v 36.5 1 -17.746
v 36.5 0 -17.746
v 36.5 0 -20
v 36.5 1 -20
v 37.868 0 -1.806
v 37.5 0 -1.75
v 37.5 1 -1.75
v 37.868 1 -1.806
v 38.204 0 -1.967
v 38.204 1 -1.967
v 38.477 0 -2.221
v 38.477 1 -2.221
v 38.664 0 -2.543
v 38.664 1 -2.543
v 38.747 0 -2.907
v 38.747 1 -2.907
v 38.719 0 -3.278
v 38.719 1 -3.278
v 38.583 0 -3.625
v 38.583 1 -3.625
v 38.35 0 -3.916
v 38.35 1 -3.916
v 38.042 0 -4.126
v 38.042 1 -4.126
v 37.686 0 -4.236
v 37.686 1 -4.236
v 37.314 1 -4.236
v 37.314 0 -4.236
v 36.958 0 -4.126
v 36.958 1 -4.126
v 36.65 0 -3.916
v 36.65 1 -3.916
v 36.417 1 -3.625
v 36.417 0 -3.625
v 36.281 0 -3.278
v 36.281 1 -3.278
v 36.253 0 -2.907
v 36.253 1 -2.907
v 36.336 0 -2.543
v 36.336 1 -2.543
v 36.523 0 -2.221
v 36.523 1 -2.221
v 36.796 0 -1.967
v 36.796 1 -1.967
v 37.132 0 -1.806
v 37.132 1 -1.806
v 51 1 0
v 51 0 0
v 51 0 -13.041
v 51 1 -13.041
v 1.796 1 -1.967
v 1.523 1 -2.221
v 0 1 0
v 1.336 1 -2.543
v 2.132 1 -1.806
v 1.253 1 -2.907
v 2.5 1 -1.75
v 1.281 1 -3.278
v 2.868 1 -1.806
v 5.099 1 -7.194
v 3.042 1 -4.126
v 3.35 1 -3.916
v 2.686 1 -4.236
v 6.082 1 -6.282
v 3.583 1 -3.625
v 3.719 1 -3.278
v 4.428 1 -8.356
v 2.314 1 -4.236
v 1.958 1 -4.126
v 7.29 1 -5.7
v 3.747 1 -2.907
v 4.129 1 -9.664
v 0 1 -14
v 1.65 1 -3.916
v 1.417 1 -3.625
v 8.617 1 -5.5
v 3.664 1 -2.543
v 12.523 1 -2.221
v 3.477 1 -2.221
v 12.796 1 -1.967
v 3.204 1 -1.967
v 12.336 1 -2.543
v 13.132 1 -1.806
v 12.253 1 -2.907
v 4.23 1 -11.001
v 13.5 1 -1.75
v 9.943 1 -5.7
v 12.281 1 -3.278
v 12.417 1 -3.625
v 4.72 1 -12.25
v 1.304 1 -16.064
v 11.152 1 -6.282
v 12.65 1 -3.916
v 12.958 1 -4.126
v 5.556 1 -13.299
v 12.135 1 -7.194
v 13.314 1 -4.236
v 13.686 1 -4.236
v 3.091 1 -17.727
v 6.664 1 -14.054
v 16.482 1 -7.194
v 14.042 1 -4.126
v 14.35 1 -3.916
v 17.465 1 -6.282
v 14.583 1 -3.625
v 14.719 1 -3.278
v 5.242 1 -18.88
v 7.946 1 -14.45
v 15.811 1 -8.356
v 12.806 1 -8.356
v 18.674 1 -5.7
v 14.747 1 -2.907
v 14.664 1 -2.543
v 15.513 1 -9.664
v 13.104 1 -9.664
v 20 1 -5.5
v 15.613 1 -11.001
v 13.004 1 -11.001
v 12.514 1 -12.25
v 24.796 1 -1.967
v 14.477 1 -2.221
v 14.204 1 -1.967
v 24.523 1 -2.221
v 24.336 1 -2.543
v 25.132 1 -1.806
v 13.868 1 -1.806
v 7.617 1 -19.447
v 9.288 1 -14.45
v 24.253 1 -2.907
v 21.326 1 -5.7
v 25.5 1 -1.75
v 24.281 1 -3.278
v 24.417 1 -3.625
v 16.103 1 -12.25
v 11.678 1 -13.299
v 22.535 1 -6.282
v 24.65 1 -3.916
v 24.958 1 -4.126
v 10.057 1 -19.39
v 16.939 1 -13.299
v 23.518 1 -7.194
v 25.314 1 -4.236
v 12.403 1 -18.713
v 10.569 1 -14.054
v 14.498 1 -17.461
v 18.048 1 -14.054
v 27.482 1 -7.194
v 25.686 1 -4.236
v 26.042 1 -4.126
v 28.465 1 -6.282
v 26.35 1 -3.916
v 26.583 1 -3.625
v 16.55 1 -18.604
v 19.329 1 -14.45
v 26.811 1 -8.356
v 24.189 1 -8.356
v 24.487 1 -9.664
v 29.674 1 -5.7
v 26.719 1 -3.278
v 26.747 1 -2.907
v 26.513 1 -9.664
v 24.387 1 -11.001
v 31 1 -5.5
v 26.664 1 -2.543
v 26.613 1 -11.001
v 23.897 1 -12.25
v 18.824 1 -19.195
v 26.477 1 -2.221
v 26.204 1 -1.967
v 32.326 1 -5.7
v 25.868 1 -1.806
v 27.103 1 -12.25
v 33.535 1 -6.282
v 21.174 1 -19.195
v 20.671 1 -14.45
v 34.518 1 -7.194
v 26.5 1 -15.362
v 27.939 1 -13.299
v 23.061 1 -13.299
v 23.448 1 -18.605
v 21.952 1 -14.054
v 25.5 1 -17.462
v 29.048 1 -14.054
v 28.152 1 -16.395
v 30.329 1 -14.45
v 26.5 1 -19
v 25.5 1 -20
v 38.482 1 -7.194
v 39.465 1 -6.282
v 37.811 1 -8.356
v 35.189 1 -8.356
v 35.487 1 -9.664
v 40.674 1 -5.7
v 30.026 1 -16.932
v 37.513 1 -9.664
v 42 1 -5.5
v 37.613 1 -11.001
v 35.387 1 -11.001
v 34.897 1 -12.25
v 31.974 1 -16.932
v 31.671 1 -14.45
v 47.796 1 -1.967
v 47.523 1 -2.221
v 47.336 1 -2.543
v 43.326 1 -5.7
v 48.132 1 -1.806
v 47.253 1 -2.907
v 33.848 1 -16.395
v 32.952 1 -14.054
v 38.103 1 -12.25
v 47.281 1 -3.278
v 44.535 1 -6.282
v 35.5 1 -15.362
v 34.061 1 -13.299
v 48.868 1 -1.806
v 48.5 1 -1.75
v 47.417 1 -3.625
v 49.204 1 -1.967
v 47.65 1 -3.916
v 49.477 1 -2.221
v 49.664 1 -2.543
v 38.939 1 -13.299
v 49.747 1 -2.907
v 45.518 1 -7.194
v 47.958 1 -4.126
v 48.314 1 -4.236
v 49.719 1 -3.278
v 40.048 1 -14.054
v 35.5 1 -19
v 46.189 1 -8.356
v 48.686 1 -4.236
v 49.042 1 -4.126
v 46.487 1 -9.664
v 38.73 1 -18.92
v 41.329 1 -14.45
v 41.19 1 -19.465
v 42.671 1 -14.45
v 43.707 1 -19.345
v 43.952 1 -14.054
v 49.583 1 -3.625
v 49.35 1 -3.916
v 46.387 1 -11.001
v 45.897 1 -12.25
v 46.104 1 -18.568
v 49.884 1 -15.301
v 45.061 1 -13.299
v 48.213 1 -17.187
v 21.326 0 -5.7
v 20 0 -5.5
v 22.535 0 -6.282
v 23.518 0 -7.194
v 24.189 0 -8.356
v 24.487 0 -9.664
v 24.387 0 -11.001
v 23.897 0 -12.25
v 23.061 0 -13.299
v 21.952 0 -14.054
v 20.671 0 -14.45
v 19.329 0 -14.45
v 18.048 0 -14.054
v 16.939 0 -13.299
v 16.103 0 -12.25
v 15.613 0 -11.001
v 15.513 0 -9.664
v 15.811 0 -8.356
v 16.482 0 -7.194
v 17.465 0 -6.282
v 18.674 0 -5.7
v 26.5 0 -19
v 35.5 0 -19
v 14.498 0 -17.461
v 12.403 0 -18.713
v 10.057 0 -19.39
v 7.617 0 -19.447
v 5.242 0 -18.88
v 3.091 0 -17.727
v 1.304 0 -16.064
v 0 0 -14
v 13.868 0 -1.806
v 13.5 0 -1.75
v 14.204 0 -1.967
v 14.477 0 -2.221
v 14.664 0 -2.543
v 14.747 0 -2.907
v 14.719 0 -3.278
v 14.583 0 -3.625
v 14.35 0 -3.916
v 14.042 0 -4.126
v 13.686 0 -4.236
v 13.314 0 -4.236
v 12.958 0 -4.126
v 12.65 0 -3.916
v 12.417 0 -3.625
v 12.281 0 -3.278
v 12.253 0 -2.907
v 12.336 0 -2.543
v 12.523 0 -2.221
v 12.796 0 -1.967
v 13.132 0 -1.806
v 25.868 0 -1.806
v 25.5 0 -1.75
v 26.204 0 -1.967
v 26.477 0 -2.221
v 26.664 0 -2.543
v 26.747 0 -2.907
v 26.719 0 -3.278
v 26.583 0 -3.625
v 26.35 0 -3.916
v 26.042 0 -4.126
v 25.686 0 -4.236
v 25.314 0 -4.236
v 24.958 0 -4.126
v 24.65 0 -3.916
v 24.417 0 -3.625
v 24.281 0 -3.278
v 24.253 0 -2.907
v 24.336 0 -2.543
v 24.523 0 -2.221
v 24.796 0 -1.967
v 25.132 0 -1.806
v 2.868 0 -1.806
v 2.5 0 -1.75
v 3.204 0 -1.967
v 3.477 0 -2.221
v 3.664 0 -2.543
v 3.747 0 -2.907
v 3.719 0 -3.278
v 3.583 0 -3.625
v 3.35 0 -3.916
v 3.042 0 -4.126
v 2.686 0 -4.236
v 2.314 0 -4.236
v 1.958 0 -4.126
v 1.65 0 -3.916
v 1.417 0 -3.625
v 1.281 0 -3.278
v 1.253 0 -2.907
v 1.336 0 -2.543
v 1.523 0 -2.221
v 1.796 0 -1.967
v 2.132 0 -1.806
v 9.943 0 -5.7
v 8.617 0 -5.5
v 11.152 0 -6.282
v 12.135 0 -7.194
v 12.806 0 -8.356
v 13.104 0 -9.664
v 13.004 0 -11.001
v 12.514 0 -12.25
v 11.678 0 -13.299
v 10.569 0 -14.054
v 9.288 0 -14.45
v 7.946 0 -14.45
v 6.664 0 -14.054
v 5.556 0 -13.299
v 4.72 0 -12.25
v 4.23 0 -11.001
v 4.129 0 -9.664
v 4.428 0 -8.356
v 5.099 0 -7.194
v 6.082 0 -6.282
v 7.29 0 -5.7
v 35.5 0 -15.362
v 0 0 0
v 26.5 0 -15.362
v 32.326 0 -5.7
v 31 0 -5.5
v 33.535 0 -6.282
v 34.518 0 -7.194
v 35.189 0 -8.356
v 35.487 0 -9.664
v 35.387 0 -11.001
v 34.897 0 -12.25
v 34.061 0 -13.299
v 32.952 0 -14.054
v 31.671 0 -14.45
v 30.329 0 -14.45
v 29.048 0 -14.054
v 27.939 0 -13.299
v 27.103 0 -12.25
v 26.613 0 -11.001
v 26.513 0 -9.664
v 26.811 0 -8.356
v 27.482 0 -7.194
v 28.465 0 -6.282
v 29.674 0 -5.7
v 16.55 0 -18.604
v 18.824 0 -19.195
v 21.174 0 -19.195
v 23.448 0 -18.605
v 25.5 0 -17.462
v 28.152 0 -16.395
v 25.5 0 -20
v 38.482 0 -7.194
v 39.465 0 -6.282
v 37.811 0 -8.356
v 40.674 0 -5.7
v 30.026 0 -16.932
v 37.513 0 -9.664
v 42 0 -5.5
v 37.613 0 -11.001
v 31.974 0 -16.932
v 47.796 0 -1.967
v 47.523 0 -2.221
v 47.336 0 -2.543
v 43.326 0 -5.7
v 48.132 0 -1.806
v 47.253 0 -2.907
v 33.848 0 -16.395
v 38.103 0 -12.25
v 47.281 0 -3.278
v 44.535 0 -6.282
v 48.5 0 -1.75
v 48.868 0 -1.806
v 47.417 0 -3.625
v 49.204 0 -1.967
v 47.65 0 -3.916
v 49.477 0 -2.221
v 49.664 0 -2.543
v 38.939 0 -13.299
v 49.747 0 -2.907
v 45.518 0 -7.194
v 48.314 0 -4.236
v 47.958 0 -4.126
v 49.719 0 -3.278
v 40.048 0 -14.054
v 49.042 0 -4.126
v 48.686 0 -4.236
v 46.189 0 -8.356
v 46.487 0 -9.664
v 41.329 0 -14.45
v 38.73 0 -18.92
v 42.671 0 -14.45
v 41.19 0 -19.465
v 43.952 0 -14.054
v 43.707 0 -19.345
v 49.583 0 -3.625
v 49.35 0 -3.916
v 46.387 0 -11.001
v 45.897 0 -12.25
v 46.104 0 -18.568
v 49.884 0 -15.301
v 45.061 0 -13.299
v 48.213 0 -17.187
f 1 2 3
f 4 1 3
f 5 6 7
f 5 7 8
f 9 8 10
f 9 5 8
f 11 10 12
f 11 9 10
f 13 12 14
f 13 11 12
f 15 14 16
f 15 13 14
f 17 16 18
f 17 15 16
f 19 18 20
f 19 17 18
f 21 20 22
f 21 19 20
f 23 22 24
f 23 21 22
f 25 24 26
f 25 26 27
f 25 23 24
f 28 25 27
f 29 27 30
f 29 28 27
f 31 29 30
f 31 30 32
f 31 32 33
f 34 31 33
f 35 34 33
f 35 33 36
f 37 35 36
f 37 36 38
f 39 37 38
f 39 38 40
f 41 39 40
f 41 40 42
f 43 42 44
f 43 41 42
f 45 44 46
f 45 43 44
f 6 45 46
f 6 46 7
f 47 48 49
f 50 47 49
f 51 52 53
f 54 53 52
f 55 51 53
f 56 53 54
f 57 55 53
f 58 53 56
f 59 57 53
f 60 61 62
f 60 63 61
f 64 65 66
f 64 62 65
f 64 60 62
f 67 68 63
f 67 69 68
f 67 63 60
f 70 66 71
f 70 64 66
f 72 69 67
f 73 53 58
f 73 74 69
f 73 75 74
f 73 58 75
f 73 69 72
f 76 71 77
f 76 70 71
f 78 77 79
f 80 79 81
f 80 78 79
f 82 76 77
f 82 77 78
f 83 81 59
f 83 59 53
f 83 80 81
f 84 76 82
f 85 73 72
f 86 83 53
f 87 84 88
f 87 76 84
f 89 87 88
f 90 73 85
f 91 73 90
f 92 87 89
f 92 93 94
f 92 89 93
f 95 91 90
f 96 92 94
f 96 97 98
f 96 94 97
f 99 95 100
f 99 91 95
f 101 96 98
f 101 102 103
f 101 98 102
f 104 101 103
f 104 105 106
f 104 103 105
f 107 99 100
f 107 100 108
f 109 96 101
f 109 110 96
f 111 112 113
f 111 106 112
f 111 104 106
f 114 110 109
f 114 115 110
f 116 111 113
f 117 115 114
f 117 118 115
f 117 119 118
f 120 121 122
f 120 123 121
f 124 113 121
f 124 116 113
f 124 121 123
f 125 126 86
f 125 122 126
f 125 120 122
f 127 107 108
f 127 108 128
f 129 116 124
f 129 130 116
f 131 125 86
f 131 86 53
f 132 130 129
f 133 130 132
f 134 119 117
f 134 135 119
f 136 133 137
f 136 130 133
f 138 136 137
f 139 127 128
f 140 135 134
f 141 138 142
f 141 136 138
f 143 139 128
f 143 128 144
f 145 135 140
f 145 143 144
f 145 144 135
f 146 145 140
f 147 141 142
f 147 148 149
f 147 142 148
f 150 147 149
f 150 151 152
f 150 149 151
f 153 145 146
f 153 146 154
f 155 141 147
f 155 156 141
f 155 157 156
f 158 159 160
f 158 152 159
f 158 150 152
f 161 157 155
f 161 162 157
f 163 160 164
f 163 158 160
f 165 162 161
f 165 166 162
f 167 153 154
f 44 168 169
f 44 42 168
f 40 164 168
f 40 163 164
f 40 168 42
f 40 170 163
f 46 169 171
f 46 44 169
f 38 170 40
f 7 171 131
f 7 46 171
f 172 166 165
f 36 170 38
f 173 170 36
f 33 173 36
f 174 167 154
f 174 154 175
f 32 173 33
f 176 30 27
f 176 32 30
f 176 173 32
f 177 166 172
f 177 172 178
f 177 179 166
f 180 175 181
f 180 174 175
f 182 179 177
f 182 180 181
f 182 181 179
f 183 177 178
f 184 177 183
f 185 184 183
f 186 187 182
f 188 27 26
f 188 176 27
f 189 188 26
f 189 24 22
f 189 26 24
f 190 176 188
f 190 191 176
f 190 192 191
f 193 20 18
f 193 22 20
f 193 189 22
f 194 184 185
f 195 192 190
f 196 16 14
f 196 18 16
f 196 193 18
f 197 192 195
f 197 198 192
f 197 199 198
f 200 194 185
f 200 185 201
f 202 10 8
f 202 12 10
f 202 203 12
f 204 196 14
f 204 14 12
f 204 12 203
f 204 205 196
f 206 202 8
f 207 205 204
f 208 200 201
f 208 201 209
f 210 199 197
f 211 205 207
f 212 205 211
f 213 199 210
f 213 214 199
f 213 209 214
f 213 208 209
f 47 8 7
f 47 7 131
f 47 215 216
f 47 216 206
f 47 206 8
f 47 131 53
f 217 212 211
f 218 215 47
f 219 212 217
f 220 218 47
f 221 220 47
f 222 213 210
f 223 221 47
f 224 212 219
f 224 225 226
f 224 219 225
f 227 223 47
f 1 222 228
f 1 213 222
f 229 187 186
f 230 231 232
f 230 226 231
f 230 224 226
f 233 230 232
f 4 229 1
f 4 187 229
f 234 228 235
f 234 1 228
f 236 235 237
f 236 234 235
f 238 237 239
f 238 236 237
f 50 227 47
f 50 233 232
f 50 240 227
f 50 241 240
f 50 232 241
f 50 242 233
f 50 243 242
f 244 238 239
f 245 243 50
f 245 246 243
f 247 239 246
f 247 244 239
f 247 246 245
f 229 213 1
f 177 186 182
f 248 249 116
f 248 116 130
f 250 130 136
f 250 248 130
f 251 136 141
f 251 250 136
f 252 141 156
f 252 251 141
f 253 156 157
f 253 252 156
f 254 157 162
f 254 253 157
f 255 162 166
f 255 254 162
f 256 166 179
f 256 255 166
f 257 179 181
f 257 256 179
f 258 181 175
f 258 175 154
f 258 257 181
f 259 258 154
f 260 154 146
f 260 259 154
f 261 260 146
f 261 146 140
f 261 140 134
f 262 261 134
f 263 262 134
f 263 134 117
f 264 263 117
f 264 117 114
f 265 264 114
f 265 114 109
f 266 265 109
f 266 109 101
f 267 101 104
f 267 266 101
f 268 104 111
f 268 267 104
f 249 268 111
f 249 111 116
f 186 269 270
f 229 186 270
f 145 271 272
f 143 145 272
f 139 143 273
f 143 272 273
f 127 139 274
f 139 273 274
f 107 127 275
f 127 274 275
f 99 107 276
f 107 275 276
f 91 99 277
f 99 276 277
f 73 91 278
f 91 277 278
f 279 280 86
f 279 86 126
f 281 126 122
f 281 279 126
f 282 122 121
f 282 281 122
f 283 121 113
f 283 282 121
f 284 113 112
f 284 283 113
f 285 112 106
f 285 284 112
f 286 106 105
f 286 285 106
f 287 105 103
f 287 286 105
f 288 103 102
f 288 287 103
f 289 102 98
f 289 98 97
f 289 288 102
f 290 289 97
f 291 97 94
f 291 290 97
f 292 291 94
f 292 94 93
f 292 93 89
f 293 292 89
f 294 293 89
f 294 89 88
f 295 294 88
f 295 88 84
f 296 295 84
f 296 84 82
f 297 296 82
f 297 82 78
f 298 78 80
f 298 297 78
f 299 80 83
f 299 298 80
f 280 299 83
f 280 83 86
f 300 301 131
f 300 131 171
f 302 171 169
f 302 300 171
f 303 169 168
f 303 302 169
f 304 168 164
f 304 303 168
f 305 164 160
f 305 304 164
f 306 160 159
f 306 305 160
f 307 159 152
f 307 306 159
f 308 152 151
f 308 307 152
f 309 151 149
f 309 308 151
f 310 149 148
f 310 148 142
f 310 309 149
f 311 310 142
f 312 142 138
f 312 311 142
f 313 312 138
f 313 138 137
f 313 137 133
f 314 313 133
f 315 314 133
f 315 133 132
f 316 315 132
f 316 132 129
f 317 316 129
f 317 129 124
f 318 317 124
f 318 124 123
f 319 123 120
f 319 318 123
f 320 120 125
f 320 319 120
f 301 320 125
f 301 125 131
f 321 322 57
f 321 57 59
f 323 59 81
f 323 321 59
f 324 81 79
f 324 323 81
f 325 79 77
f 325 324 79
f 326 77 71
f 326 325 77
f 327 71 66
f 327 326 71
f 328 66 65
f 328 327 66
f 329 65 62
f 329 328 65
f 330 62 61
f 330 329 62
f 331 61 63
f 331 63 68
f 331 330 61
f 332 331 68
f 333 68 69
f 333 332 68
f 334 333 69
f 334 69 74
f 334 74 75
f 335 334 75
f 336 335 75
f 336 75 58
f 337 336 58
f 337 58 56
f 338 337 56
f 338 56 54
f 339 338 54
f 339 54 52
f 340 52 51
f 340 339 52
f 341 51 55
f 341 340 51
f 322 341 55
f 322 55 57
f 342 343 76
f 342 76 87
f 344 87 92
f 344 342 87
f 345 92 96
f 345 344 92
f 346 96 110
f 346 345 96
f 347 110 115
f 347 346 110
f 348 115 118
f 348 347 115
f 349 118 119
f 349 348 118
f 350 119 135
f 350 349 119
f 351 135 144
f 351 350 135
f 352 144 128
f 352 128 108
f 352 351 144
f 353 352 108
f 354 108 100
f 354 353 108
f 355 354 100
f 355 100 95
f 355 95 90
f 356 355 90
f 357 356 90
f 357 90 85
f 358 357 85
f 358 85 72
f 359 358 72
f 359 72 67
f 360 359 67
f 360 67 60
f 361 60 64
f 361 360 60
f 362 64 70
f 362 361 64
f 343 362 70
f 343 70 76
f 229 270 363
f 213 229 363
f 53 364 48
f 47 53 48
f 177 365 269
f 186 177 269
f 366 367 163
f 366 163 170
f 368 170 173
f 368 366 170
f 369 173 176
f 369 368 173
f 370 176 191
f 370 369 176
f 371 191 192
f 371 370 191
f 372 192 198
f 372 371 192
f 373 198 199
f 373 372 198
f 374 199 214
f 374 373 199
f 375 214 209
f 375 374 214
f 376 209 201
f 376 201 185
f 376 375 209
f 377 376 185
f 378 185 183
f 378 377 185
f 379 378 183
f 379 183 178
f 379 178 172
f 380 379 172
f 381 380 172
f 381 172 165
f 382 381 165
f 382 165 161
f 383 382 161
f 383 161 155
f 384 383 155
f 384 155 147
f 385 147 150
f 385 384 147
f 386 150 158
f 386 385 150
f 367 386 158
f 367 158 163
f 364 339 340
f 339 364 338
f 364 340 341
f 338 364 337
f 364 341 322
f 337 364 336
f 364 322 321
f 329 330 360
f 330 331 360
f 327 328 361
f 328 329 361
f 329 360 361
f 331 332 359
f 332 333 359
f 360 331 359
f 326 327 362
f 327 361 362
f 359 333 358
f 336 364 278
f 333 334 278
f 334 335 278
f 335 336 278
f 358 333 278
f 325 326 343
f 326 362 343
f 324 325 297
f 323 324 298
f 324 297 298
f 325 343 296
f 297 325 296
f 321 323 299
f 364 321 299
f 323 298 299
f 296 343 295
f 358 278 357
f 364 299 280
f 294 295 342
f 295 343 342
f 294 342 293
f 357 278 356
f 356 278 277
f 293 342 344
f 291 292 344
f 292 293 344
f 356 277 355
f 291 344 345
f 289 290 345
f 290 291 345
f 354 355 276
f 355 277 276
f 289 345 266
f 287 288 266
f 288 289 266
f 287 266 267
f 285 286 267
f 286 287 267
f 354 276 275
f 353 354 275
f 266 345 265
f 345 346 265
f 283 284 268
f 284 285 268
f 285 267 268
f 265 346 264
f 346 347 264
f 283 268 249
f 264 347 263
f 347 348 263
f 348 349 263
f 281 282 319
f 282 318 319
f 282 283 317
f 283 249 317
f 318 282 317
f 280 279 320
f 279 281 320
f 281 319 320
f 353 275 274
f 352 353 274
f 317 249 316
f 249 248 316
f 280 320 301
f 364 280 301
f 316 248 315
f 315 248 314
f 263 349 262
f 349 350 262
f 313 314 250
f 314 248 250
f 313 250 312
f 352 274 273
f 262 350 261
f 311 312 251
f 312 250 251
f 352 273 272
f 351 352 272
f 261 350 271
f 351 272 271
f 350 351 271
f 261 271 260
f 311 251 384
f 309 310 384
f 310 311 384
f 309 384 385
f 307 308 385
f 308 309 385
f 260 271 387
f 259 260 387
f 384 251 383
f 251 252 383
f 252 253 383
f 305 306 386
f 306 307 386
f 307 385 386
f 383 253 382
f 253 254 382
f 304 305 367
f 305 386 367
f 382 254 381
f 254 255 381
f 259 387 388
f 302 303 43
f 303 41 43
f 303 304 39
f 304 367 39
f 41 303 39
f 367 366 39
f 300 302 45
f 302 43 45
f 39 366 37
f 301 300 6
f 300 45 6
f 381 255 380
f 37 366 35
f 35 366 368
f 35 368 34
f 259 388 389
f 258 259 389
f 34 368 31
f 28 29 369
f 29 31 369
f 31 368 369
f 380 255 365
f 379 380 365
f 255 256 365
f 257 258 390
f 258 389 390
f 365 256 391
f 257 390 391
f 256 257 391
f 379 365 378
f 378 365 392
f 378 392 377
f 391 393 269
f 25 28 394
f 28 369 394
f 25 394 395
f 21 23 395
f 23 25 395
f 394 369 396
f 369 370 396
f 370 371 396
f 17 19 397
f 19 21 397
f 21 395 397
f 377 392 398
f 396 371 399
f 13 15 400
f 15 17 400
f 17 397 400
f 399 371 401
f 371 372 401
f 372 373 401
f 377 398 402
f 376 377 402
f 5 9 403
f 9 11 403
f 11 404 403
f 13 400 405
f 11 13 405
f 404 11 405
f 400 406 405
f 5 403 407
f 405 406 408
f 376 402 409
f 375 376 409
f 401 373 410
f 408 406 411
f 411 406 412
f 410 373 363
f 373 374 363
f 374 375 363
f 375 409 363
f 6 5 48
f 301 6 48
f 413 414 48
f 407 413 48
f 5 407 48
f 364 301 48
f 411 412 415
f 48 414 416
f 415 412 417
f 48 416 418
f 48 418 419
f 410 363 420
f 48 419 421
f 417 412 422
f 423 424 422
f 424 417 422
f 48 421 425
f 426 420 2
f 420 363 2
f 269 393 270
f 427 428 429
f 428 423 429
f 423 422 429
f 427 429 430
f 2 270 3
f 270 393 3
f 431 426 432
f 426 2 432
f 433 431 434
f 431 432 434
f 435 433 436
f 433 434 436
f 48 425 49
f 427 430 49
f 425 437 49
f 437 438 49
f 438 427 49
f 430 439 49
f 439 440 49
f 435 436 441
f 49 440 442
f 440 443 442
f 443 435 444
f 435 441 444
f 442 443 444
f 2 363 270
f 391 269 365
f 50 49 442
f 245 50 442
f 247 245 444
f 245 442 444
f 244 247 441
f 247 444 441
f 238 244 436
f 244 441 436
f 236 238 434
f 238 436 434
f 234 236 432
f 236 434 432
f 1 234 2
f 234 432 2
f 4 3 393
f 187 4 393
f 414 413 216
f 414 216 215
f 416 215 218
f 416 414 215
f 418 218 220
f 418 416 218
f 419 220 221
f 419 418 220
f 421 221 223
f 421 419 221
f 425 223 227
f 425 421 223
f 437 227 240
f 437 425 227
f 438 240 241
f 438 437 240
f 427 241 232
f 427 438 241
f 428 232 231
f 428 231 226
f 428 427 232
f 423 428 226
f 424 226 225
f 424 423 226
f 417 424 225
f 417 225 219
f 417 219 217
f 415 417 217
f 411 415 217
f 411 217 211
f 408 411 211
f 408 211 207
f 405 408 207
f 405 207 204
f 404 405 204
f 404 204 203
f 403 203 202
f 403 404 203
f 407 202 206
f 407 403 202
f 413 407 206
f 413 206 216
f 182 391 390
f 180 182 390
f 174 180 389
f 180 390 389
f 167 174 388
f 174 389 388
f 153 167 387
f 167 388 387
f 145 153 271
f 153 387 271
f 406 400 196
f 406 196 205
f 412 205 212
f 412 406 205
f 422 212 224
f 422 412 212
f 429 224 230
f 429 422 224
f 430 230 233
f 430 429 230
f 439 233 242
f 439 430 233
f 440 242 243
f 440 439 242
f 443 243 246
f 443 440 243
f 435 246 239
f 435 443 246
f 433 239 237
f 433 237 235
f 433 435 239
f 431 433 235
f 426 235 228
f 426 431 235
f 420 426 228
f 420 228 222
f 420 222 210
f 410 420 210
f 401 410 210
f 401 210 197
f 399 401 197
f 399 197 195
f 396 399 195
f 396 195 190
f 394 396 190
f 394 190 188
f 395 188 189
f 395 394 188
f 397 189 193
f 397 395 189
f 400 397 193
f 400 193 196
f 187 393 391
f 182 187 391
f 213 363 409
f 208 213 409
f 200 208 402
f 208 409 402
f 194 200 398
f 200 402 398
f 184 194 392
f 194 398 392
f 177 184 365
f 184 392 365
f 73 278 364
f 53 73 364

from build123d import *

# Parameters (mm, degrees)
SKETCH1_R           = 1.25
SKETCH1_R_2         = 4.5
BOSS_EXTRUDE1_DEPTH = 1


with BuildPart() as part:
    # Sketch1 → Boss-Extrude1 (new body)
    with BuildSketch(Plane(origin=(0, 0, 0), x_dir=(1, 0, 0), z_dir=(0, 1, 0))):
        with BuildLine():
            ThreePointArc((25.5, 17.461803162), (19.998907706, 19.269762955), (14.498241643, 17.46050678))
            ThreePointArc((14.498241643, 17.46050678), (6.411295647, 19.240430542), (0, 14))
            Line((0, 14), (0, 0))
            Line((0, 0), (51, 0))
            Line((51, 0), (51, 13.041381265))
            ThreePointArc((51, 13.041381265), (44.93185624, 19.036272406), (36.5, 17.745966692))
            Line((36.5, 17.745966692), (36.5, 20))
            Line((36.5, 20), (25.5, 20))
            Line((25.5, 20), (25.5, 17.461803162))
        make_face()
        with Locations(Location((48.5, 3, 0), (0, 0, 270))):
            Circle(SKETCH1_R, mode=Mode.SUBTRACT)
        with Locations(Location((37.5, 3, 0), (0, 0, 270))):
            Circle(SKETCH1_R, mode=Mode.SUBTRACT)
        with Locations(Location((25.5, 3, 0), (0, 0, 270))):
            Circle(SKETCH1_R, mode=Mode.SUBTRACT)
        with Locations(Location((8.61684397, 10, 0), (0, 0, 270))):
            Circle(SKETCH1_R_2, mode=Mode.SUBTRACT)
        with Locations(Location((20, 10, 0), (0, 0, 270))):
            Circle(SKETCH1_R_2, mode=Mode.SUBTRACT)
        with Locations(Location((31, 10, 0), (0, 0, 270))):
            Circle(SKETCH1_R_2, mode=Mode.SUBTRACT)
        with Locations(Location((42, 10, 0), (0, 0, 270))):
            Circle(SKETCH1_R_2, mode=Mode.SUBTRACT)
        with Locations(Location((2.5, 3, 0), (0, 0, 270))):
            Circle(SKETCH1_R, mode=Mode.SUBTRACT)
        with Locations(Location((13.5, 3, 0), (0, 0, 270))):
            Circle(SKETCH1_R, mode=Mode.SUBTRACT)
        with BuildLine():
            Line((35.5, 19), (35.5, 15.361902647))
            ThreePointArc((35.5, 15.361902647), (31, 17), (26.5, 15.361902647))
            Line((26.5, 15.361902647), (26.5, 19))
            Line((26.5, 19), (35.5, 19))
        make_face(mode=Mode.SUBTRACT)
    extrude(amount=BOSS_EXTRUDE1_DEPTH)


solid = part.part
